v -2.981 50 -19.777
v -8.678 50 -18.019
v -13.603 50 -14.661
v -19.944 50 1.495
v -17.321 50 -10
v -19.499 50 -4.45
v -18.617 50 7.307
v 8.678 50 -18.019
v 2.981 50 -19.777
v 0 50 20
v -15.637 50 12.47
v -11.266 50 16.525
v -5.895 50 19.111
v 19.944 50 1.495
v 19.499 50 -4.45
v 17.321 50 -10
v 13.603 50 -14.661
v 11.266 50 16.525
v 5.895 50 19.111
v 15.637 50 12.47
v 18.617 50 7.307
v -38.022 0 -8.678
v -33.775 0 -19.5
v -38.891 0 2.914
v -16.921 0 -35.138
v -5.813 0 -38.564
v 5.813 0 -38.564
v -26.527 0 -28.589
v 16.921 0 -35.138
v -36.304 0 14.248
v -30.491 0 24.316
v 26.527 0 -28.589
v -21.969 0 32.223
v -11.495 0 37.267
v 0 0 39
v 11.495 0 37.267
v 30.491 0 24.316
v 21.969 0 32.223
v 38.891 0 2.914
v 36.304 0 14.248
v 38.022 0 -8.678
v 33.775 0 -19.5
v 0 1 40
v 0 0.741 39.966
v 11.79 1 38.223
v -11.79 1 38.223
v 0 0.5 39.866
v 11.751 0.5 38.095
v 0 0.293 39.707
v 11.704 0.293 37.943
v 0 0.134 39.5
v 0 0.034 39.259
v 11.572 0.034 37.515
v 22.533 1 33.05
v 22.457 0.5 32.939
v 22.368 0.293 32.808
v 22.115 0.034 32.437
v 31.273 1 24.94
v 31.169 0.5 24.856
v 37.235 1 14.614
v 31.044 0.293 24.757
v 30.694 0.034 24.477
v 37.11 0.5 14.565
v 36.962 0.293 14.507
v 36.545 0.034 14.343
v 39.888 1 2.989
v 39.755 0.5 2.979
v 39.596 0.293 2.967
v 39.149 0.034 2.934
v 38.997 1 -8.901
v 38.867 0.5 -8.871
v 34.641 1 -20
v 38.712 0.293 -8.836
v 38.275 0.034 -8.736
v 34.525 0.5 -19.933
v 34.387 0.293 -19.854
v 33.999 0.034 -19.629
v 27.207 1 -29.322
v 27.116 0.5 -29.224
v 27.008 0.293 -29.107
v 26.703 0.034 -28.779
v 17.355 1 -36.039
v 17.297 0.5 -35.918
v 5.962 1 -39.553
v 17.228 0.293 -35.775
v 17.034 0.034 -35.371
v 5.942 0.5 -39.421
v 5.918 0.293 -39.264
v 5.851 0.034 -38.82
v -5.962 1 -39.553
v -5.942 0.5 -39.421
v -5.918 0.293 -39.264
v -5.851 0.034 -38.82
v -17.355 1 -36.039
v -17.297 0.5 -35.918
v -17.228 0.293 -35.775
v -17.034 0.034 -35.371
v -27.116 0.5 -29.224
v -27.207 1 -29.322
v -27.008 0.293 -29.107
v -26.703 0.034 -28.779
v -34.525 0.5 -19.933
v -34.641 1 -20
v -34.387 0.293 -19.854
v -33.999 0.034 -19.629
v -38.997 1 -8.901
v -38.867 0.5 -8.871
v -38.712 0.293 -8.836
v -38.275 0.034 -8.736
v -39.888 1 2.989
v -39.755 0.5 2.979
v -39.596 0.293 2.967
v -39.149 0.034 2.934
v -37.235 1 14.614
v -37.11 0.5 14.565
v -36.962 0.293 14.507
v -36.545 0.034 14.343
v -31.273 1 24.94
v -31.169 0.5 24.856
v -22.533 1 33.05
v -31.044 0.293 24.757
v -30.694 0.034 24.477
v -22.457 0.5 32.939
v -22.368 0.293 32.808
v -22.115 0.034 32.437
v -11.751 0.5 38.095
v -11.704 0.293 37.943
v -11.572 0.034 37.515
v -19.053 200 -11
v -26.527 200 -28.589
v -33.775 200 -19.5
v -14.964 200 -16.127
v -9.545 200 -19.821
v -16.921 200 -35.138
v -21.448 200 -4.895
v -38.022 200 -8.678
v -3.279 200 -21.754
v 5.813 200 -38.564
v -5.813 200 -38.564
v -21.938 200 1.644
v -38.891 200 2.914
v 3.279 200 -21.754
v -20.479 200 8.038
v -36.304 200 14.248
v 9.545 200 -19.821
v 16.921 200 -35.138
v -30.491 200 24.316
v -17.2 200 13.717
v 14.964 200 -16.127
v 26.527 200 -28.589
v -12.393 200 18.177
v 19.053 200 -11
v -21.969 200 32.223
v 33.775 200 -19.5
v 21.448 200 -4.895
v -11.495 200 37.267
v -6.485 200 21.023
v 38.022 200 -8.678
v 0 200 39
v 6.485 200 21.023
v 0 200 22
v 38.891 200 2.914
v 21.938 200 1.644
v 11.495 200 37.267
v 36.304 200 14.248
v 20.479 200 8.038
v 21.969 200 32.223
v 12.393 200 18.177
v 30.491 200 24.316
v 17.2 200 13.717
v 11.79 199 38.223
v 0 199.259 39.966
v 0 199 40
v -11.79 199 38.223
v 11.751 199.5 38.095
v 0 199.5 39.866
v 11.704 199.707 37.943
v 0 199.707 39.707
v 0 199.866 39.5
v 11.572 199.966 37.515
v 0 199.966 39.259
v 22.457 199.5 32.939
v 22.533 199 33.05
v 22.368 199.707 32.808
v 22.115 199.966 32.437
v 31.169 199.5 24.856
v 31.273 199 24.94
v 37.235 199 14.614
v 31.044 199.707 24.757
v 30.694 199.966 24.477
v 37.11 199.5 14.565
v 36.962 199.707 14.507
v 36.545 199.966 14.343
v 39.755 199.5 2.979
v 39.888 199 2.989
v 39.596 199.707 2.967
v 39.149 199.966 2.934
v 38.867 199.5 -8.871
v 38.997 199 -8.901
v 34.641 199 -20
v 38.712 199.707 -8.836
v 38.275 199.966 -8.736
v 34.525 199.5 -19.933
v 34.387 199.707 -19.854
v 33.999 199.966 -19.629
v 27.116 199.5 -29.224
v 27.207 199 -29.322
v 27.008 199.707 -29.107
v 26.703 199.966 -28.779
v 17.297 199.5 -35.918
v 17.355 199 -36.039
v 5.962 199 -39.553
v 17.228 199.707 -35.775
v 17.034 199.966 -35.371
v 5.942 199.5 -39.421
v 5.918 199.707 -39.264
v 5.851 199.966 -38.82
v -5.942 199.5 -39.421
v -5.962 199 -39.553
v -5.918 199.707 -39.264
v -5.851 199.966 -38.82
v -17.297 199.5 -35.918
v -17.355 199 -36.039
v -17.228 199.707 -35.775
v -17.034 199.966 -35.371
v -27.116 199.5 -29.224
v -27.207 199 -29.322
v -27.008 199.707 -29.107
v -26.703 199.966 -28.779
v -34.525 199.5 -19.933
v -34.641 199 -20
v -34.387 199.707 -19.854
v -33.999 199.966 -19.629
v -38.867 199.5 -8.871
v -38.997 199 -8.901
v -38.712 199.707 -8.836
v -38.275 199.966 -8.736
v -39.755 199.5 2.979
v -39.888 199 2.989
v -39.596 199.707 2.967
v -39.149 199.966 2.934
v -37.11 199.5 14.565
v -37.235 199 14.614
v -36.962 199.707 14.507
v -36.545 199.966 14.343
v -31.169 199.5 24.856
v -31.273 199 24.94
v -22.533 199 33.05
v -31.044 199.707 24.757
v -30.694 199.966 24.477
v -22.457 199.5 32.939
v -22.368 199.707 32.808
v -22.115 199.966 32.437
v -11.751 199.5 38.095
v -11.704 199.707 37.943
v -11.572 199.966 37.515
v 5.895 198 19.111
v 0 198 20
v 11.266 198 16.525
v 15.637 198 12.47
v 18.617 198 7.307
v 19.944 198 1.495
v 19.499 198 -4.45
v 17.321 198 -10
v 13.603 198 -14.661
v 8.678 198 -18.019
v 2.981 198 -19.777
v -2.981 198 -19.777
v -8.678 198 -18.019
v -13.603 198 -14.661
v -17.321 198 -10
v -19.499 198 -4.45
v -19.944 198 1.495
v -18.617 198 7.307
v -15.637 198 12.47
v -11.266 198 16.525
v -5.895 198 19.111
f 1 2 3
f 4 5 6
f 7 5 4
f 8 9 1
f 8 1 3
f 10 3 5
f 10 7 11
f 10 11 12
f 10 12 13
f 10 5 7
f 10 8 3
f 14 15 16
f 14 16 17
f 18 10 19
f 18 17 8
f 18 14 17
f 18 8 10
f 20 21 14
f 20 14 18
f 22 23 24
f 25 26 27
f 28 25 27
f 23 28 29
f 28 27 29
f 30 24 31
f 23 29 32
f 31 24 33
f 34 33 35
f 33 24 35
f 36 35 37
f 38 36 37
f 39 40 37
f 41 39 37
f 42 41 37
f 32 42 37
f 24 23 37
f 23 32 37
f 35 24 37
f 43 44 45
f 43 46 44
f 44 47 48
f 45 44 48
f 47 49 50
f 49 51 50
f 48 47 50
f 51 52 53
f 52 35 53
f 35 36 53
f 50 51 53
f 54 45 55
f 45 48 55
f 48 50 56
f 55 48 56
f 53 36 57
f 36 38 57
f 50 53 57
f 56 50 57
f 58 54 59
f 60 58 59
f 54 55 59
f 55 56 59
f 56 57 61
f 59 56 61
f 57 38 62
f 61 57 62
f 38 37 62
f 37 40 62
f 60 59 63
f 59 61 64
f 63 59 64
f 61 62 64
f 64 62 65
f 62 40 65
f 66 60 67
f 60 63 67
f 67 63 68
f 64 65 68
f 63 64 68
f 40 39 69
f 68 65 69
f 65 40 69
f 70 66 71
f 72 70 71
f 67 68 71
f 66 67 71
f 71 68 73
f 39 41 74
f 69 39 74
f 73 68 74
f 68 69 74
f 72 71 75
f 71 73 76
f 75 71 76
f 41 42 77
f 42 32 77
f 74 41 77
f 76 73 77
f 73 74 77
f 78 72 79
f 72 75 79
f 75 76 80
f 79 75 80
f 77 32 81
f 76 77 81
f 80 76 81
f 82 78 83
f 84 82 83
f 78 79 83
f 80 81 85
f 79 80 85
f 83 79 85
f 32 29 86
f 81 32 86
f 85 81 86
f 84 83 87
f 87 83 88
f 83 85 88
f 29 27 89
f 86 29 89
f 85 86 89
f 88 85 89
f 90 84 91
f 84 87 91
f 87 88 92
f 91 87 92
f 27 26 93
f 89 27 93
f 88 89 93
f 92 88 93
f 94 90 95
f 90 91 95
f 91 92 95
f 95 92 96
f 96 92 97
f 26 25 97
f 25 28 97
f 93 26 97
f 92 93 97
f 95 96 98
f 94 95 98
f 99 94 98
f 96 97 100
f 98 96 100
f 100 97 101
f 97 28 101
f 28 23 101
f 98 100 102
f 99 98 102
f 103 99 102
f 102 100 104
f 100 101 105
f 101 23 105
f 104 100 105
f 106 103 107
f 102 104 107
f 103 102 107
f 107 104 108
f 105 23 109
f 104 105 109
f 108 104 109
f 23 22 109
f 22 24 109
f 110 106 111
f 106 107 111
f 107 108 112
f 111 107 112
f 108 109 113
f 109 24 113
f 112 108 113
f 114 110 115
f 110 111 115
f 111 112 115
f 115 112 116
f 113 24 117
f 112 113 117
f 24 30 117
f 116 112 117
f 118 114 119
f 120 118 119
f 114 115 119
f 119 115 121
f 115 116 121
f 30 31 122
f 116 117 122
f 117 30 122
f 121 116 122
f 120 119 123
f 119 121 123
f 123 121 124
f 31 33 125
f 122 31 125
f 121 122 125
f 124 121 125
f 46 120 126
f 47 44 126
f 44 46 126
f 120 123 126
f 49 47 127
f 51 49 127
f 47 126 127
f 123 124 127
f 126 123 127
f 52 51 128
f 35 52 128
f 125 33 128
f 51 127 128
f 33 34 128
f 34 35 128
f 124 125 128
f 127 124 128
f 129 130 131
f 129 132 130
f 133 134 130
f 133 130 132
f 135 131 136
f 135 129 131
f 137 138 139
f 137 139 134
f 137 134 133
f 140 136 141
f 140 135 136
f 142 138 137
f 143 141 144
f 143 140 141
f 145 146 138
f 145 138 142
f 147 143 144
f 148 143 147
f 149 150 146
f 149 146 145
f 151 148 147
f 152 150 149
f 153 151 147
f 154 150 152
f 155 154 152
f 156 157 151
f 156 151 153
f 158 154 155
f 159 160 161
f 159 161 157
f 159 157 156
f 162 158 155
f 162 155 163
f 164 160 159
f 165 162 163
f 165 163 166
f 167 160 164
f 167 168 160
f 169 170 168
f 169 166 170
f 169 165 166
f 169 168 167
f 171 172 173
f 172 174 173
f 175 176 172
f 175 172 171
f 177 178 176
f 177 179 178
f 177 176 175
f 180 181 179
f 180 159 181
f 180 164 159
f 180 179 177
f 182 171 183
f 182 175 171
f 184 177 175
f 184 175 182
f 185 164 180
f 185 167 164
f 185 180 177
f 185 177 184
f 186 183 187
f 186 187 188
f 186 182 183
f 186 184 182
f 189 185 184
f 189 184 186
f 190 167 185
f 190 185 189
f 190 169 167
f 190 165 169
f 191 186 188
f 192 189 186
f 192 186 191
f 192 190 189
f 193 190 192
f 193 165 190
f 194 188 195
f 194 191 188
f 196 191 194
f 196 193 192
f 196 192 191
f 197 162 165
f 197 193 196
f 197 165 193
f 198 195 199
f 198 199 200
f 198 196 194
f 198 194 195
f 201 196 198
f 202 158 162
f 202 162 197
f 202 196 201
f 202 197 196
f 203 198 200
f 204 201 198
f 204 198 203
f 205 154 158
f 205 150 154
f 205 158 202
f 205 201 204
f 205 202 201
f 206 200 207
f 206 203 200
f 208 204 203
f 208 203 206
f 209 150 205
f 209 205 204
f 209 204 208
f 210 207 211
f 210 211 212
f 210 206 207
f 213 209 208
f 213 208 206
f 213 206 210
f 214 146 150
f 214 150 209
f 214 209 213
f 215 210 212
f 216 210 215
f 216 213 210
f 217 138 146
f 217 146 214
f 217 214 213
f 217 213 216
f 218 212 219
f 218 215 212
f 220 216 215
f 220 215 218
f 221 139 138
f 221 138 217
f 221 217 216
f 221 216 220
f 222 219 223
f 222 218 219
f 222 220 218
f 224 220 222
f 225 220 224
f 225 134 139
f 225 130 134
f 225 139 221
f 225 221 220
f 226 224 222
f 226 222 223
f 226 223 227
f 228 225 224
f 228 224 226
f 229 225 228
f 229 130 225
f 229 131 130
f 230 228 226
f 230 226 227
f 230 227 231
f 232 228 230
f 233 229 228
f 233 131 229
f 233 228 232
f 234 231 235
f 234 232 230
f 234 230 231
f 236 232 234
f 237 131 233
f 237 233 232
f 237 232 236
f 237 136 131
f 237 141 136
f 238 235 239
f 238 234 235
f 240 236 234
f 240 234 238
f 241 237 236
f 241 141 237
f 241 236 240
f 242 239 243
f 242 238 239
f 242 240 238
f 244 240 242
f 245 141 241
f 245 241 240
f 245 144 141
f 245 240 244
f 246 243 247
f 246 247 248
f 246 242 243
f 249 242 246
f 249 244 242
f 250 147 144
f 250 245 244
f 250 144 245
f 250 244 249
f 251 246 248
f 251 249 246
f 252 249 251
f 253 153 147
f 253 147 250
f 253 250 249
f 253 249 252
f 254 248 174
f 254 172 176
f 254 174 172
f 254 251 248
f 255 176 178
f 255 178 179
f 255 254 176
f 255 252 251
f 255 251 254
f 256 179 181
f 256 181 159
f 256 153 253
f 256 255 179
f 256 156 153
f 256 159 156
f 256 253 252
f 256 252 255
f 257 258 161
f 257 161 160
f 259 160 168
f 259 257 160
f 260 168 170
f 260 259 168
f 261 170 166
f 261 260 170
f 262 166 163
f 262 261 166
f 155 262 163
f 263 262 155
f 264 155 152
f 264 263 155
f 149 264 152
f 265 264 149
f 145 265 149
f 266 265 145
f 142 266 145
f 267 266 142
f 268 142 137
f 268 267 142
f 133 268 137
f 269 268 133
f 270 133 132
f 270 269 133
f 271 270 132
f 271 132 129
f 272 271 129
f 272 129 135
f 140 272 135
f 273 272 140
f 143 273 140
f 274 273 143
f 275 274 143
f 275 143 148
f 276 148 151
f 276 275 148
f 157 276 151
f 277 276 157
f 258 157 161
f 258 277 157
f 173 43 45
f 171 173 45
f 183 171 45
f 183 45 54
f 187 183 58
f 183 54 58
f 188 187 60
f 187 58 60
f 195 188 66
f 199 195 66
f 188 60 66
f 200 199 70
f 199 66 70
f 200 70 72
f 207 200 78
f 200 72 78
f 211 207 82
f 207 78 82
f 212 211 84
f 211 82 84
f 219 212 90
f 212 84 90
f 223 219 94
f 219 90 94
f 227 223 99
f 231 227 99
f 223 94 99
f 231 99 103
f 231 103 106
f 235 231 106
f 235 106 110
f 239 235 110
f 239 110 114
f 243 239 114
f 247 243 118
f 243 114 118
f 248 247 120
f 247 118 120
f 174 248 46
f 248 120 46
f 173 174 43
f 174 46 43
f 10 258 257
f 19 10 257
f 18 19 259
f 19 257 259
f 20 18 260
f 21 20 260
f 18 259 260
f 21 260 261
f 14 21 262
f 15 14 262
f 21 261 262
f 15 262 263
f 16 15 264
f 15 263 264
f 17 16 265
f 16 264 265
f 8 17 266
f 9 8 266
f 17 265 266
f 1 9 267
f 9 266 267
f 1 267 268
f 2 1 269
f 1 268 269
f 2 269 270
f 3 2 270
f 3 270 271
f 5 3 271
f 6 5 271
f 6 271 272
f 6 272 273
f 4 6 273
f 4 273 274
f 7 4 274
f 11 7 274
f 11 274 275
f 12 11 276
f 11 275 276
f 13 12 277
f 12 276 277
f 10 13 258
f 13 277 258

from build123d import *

# Parameters (mm, degrees)
SKETCH_1_R          = 40
EXTRUDE_1_DEPTH     = 200
SKETCH_2_R          = 20
CUT_EXTRUDE_1_DEPTH = 150
CHAMFER_1_SIZE      = 2
FILLET_1_R          = 1
FILLET_2_R          = 1


with BuildPart() as part:
    # Эскиз1 → Бобышка-Вытянуть1 (new body)
    with BuildSketch(Plane(origin=(0, 0, 0), x_dir=(1, 0, 0), z_dir=(0, 1, 0))):
        with Locations(Location((0, 0, 0), (0, 0, 270))):
            Circle(SKETCH_1_R)
    extrude(amount=EXTRUDE_1_DEPTH)

    # Эскиз2 → Вырез-Вытянуть1 (cut)
    with BuildSketch(Plane(origin=(0, 200, 0), x_dir=(1, 0, 0), z_dir=(0, 1, 0))):
        with Locations(Location((0, 0, 0), (0, 0, 270))):
            Circle(SKETCH_2_R)
    extrude(amount=-CUT_EXTRUDE_1_DEPTH, mode=Mode.SUBTRACT)

    # Фаска1
    chamfer_1_edges = [part.edges().sort_by_distance(p)[0] for p in [
        (0, 200, -20),
    ]]
    chamfer(chamfer_1_edges, length=CHAMFER_1_SIZE)

    # Скругление1
    fillet_1_edges = [part.edges().sort_by_distance(p)[0] for p in [
        (0, 0, -40),
    ]]
    fillet(fillet_1_edges, radius=FILLET_1_R)

    # Скругление2
    fillet_2_edges = [part.edges().sort_by_distance(p)[0] for p in [
        (0, 200, -40),
    ]]
    fillet(fillet_2_edges, radius=FILLET_2_R)


solid = part.part
